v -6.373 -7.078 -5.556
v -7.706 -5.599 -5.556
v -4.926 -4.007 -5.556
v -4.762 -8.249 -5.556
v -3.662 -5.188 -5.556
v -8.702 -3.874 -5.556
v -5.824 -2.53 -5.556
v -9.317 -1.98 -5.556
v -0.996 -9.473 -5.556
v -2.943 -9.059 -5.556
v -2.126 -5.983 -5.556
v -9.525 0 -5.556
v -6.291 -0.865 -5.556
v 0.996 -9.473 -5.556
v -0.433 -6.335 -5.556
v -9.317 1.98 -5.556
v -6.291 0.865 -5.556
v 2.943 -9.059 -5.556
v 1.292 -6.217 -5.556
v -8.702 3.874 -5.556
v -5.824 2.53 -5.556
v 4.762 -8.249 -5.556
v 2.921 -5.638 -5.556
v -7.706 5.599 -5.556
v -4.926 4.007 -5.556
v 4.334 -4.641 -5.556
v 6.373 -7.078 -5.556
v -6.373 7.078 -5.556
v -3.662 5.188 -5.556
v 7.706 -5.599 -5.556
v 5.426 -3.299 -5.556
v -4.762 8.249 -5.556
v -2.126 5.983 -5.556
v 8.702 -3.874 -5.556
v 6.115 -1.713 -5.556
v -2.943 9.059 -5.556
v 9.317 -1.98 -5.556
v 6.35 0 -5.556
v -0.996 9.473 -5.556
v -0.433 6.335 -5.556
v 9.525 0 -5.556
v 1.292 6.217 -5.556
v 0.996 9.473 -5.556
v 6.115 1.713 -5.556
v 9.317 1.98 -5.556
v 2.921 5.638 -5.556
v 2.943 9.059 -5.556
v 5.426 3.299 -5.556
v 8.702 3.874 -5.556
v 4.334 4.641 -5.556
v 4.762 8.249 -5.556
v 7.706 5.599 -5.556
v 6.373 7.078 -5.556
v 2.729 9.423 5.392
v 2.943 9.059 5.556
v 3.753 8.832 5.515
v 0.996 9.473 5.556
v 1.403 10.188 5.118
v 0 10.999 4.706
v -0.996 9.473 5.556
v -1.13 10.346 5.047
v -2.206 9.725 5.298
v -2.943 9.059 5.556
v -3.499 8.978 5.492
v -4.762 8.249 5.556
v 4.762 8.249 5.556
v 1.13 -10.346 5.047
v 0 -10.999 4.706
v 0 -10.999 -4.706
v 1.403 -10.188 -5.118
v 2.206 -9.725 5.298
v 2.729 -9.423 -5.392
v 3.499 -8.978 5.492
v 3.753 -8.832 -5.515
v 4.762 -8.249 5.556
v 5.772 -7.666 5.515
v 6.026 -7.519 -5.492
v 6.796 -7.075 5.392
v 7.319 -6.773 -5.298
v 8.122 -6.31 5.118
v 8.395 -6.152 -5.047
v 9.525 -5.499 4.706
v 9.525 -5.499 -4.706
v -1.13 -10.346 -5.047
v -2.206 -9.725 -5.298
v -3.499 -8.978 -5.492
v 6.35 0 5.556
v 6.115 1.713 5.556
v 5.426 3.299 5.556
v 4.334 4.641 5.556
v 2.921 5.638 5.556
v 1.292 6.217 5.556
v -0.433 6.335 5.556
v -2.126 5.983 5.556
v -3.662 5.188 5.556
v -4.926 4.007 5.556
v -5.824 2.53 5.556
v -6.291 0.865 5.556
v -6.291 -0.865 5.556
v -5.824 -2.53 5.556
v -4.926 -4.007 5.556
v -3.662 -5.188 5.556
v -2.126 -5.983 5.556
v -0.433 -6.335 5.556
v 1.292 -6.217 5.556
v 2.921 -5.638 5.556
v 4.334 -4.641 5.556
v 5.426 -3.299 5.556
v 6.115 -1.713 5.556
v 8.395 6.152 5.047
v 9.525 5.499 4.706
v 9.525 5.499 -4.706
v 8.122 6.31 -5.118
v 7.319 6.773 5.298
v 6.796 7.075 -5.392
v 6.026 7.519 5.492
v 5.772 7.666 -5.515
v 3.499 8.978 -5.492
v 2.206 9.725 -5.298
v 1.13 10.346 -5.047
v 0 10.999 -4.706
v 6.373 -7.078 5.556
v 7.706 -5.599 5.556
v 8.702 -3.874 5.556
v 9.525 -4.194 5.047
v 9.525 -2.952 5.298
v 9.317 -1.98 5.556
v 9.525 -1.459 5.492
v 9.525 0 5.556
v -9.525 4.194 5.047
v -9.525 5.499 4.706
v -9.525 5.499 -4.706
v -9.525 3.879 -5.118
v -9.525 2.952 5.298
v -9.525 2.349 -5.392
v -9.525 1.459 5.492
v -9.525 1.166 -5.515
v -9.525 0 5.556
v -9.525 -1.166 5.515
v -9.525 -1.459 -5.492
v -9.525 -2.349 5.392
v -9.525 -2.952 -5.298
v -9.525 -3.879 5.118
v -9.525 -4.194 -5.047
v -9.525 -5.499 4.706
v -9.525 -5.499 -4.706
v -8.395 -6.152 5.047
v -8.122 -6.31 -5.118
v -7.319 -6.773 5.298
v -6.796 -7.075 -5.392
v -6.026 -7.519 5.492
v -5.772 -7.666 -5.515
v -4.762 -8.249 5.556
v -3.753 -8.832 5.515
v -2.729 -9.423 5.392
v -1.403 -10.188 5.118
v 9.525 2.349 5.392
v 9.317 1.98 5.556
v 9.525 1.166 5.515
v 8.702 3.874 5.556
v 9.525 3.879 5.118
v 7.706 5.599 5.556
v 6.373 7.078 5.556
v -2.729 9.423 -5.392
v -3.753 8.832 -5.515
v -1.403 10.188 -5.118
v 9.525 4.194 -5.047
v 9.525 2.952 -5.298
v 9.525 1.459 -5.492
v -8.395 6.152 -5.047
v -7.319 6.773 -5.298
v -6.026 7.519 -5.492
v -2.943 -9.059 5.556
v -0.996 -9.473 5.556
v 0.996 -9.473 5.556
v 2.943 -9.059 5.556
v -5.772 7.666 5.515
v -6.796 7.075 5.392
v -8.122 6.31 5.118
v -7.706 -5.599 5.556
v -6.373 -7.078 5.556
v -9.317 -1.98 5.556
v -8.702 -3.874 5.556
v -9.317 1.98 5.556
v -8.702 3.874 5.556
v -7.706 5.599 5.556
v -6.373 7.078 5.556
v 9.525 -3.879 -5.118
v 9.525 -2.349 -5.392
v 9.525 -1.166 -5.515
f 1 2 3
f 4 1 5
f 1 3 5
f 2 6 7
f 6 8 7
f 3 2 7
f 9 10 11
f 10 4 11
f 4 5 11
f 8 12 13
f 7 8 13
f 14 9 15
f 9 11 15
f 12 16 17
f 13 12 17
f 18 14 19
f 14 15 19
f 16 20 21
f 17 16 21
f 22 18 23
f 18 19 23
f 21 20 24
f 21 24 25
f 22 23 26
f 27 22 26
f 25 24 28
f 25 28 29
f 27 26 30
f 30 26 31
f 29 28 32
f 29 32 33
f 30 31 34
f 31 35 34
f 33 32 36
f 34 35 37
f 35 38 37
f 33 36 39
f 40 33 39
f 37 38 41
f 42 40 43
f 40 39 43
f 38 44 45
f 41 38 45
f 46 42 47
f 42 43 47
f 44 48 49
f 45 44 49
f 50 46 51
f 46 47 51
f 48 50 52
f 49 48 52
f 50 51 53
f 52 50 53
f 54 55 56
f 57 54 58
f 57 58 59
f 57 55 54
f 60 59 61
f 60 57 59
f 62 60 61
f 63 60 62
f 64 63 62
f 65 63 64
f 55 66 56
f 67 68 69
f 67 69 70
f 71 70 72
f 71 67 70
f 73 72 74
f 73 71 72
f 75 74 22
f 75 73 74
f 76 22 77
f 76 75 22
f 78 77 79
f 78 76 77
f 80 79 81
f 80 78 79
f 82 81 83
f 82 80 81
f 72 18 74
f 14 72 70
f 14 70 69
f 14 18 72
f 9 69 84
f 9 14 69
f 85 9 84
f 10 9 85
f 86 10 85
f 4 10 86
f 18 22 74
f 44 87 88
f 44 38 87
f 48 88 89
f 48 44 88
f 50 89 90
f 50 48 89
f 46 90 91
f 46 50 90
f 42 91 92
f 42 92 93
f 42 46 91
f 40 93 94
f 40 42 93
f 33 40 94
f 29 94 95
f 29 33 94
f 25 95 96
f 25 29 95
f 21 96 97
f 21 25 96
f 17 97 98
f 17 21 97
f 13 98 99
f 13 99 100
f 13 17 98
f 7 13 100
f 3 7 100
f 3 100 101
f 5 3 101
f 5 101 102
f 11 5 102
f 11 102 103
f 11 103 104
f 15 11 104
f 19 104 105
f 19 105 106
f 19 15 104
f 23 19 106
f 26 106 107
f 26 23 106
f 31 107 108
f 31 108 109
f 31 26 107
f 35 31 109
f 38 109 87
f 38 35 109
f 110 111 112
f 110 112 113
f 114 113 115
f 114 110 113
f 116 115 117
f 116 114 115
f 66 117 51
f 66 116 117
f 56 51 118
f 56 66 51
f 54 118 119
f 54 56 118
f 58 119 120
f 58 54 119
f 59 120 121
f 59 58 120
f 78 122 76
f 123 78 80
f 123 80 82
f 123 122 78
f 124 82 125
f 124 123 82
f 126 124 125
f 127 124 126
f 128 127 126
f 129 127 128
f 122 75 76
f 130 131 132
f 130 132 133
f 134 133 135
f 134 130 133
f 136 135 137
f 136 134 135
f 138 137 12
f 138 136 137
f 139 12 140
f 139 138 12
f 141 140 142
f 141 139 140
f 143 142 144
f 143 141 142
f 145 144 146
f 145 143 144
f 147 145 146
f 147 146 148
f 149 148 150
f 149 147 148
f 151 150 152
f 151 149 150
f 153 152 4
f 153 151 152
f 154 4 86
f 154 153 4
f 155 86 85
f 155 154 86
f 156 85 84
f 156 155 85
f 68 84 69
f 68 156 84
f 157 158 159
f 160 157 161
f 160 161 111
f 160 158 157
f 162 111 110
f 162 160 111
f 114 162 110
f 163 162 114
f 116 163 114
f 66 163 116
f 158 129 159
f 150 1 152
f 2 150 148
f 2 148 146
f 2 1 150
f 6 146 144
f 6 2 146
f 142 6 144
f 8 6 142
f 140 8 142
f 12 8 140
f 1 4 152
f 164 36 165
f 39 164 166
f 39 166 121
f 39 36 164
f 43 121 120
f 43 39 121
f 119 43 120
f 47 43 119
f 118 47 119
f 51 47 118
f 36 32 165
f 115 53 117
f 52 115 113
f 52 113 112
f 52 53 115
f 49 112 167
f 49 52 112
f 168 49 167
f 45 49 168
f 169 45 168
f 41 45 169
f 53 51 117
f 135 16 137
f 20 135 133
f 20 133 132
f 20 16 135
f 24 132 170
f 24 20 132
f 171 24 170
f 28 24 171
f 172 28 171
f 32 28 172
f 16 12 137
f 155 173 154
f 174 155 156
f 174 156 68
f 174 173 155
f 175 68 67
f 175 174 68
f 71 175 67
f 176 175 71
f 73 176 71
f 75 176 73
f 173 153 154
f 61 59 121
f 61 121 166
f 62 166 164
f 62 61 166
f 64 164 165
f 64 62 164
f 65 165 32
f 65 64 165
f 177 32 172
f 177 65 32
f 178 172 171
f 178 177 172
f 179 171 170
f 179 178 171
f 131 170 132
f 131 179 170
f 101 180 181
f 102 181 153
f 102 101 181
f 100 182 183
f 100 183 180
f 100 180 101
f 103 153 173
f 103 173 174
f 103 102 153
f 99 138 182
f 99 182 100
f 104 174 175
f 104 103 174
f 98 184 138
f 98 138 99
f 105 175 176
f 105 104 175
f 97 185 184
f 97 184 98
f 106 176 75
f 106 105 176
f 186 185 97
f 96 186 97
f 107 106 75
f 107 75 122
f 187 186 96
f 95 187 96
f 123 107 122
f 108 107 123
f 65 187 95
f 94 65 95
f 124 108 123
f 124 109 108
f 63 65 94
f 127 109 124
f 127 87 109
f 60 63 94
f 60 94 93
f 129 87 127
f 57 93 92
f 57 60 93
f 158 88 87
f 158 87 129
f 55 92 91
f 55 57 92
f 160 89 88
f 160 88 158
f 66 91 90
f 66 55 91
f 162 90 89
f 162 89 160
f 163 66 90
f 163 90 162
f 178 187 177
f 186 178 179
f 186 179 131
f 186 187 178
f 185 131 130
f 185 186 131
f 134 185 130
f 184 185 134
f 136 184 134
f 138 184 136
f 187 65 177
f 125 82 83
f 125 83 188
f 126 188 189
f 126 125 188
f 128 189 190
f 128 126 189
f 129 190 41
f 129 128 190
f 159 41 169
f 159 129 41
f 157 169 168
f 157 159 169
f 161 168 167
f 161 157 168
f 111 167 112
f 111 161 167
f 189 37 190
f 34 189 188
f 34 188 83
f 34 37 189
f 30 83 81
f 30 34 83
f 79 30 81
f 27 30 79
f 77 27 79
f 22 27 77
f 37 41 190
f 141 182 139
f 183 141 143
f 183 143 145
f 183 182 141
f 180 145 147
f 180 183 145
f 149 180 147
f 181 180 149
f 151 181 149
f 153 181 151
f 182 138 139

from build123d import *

# Parameters (mm, degrees)
SKETCH1_R               = 6.35
EXTRUDE1_DEPTH          = 5.55625
SKETCH7_OUTSIDE_W       = 115.268
SKETCH7_OUTSIDE_H       = 118.216
SKETCH7_OUTSIDE_R       = 9.525
EXTRUDE2_DEPTH          = 25.4
EXTRUDE2_DRAFT          = -60
MIRROR1_COPY_1_SKETCH_W = 115.268
MIRROR1_COPY_1_SKETCH_H = 118.216
MIRROR1_COPY_1_SKETCH_R = 9.525
MIRROR1_COPY_1_DEPTH    = 25.4
MIRROR1_COPY_1_DRAFT    = -60


with BuildPart() as part:
    # Sketch1 → Extrude1 (new, symmetric)
    with BuildSketch(Plane.XY):
        Polygon((-9.525, 5.499261314), (-9.525, -5.499261314), (0, -10.998522628), (9.525, -5.499261314), (9.525, 5.499261314), (0, 10.998522628), align=None)
        Circle(SKETCH1_R, mode=Mode.SUBTRACT)
    extrude(amount=EXTRUDE1_DEPTH, both=True)


with BuildPart() as extrude2_tool:
    # Sketch7 outside → Extrude2 (with draft: the straight prism first)
    with BuildSketch(Plane.XY.offset(5.55625)):
        Rectangle(SKETCH7_OUTSIDE_W, SKETCH7_OUTSIDE_H)
        Circle(SKETCH7_OUTSIDE_R, mode=Mode.SUBTRACT)
    extrude(amount=-EXTRUDE2_DEPTH)
    # Extrude2: the draft: its side faces are tilted about the plane it starts from
    extrude2_sides = [extrude2_tool.faces().sort_by_distance(p)[0] for p in [
        (0, -59.108, -7.14375),
        (57.634, 0, -7.14375),
        (0, 59.108, -7.14375),
        (-57.634, 0, -7.14375),
        (-9.525, 0, -7.14375),
    ]]
    draft(extrude2_sides, Plane.XY.offset(5.55625), EXTRUDE2_DRAFT)


with BuildPart() as part_1:
    add(part.part)

    # Extrude2: cut by extrude2_tool
    add(extrude2_tool.part, mode=Mode.SUBTRACT)


with BuildPart() as mirror1_copy_1_tool:
    # Mirror1 copy 1 sketch → Mirror1 copy 1 (with draft: the straight prism first)
    with BuildSketch(Plane(origin=(0, 0, -5.55625), x_dir=(1, 0, 0), z_dir=(0, 0, -1))):
        Rectangle(MIRROR1_COPY_1_SKETCH_W, MIRROR1_COPY_1_SKETCH_H)
        Circle(MIRROR1_COPY_1_SKETCH_R, mode=Mode.SUBTRACT)
    extrude(amount=-MIRROR1_COPY_1_DEPTH)
    # Mirror1 copy 1: the draft: its side faces are tilted about the plane it starts from
    mirror1_copy_1_sides = [mirror1_copy_1_tool.faces().sort_by_distance(p)[0] for p in [
        (0, -59.108, 7.14375),
        (57.634, 0, 7.14375),
        (0, 59.108, 7.14375),
        (-57.634, 0, 7.14375),
        (-9.525, 0, 7.14375),
    ]]
    draft(mirror1_copy_1_sides, Plane(origin=(0, 0, -5.55625), x_dir=(1, 0, 0), z_dir=(0, 0, -1)), MIRROR1_COPY_1_DRAFT)


with BuildPart() as part_2:
    add(part_1.part)

    # Mirror1 copy 1: cut by mirror1_copy_1_tool
    add(mirror1_copy_1_tool.part, mode=Mode.SUBTRACT)


solid = part_2.part
